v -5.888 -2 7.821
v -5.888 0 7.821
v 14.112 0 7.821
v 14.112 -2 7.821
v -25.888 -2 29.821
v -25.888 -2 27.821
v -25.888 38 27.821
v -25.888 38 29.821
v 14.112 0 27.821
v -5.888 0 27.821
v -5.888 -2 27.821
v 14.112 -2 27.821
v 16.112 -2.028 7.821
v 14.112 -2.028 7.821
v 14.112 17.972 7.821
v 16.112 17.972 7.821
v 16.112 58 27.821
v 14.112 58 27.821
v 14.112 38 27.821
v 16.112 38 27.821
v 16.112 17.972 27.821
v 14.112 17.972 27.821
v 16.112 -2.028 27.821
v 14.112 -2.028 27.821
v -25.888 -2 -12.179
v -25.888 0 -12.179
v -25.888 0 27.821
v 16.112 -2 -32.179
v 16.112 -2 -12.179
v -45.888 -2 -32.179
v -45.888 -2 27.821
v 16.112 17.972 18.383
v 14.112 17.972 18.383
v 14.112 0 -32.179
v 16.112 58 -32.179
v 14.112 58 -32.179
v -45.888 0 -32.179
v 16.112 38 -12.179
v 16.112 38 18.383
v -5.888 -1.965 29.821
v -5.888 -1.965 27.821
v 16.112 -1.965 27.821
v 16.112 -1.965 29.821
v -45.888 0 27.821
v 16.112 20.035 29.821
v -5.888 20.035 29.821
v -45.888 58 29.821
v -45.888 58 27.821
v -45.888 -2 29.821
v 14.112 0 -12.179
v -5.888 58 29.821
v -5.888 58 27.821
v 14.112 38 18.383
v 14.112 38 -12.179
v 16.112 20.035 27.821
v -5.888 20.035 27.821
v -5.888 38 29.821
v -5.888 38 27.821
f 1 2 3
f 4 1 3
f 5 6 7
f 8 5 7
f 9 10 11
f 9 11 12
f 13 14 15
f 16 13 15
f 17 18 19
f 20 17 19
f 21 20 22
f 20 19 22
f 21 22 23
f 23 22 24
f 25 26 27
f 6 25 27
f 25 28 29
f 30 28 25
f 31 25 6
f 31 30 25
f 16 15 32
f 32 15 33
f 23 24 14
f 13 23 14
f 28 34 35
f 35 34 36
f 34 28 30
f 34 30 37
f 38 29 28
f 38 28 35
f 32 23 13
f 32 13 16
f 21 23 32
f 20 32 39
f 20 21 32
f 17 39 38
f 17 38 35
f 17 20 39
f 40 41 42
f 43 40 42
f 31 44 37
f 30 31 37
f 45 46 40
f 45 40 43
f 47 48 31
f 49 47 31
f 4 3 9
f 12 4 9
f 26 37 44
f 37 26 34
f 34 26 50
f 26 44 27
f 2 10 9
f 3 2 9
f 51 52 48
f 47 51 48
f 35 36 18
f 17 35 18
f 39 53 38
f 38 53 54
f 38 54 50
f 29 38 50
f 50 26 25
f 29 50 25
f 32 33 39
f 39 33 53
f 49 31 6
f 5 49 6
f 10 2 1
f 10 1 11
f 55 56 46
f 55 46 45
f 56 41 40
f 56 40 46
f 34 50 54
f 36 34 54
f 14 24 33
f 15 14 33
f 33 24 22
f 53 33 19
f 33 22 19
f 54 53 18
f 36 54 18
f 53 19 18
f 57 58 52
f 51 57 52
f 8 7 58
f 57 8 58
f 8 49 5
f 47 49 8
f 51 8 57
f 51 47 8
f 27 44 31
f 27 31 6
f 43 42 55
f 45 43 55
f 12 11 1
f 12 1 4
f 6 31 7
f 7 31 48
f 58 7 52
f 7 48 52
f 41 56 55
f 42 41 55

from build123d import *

# Parameters (mm, degrees)
F0_W     = 20
F0_H     = 40
F0_H_2   = 20
F0_W_2   = 40
F1_DEPTH = 2
F2_W     = 40
F2_H     = 20
F2_W_2   = 20
F2_W_3   = 20.0283188205
F2_H_2   = 9.4384654047
F3_DEPTH = 2
F4_W     = 20
F4_H     = 40
F4_H_2   = 20
F5_DEPTH = 2
F4_W_2   = 22
F4_H_3   = 22


with BuildPart() as f1:
    # F0 (on Front) → F1 (new body)
    with BuildSketch(Plane.XZ):
        with Locations((-35.8879165724, 7.8213110747)):
            Rectangle(F0_W, F0_H)
        with Locations((-35.8879165724, -22.1786889253)):
            Rectangle(F0_W, F0_H_2)
        with Locations((-5.8879165724, -22.1786889253)):
            Rectangle(F0_W_2, F0_H_2)
    extrude(amount=F1_DEPTH)

    # F2 (on face) → F3 (join)
    with BuildSketch(Plane.YZ.offset(14.1120834276)):
        with Locations((18, -22.1786889253)):
            Rectangle(F2_W, F2_H)
        with Locations((48, -22.1786889253)):
            Rectangle(F2_W_2, F2_H)
        Polygon((38, 18.38284567), (38, -12.1786889253), (58, -12.1786889253), (58, 27.8213110747), (38, 27.8213110747), align=None)
        with Locations((27.9858405897, 23.1020783723)):
            Rectangle(F2_W_3, F2_H_2)
        Polygon((17.9716811795, 7.8213110747), (17.9716811795, 18.38284567), (17.9716811795, 27.8213110747), (-2.0283188205, 27.8213110747), (-2.0283188205, 7.8213110747), align=None)
    extrude(amount=F3_DEPTH)


with BuildPart() as f1b:
    # F0 (on Front) → F1, piece 2 (new body)
    with BuildSketch(Plane.XZ):
        with Locations((4.1120834276, 17.8213110747)):
            Rectangle(F0_W, F0_H_2)
    extrude(amount=F1_DEPTH)


with BuildPart() as f5:
    # F4 (on face) → F5 (new body)
    with BuildSketch(Plane.XY.offset(27.8213110747)):
        with Locations((-35.8879165724, 18)):
            Rectangle(F4_W, F4_H)
        with Locations((-35.8879165724, 48)):
            Rectangle(F4_W, F4_H_2)
        with Locations((-15.8879165724, 48)):
            Rectangle(F4_W, F4_H_2)
    extrude(amount=F5_DEPTH)


with BuildPart() as f5b:
    # F4 (on face) → F5, piece 2 (new body)
    with BuildSketch(Plane.XY.offset(27.8213110747)):
        with Locations((5.1120834276, 9.0354546569)):
            Rectangle(F4_W_2, F4_H_3)
    extrude(amount=F5_DEPTH)


solid = Compound([f1.part, f1b.part, f5.part, f5b.part])
